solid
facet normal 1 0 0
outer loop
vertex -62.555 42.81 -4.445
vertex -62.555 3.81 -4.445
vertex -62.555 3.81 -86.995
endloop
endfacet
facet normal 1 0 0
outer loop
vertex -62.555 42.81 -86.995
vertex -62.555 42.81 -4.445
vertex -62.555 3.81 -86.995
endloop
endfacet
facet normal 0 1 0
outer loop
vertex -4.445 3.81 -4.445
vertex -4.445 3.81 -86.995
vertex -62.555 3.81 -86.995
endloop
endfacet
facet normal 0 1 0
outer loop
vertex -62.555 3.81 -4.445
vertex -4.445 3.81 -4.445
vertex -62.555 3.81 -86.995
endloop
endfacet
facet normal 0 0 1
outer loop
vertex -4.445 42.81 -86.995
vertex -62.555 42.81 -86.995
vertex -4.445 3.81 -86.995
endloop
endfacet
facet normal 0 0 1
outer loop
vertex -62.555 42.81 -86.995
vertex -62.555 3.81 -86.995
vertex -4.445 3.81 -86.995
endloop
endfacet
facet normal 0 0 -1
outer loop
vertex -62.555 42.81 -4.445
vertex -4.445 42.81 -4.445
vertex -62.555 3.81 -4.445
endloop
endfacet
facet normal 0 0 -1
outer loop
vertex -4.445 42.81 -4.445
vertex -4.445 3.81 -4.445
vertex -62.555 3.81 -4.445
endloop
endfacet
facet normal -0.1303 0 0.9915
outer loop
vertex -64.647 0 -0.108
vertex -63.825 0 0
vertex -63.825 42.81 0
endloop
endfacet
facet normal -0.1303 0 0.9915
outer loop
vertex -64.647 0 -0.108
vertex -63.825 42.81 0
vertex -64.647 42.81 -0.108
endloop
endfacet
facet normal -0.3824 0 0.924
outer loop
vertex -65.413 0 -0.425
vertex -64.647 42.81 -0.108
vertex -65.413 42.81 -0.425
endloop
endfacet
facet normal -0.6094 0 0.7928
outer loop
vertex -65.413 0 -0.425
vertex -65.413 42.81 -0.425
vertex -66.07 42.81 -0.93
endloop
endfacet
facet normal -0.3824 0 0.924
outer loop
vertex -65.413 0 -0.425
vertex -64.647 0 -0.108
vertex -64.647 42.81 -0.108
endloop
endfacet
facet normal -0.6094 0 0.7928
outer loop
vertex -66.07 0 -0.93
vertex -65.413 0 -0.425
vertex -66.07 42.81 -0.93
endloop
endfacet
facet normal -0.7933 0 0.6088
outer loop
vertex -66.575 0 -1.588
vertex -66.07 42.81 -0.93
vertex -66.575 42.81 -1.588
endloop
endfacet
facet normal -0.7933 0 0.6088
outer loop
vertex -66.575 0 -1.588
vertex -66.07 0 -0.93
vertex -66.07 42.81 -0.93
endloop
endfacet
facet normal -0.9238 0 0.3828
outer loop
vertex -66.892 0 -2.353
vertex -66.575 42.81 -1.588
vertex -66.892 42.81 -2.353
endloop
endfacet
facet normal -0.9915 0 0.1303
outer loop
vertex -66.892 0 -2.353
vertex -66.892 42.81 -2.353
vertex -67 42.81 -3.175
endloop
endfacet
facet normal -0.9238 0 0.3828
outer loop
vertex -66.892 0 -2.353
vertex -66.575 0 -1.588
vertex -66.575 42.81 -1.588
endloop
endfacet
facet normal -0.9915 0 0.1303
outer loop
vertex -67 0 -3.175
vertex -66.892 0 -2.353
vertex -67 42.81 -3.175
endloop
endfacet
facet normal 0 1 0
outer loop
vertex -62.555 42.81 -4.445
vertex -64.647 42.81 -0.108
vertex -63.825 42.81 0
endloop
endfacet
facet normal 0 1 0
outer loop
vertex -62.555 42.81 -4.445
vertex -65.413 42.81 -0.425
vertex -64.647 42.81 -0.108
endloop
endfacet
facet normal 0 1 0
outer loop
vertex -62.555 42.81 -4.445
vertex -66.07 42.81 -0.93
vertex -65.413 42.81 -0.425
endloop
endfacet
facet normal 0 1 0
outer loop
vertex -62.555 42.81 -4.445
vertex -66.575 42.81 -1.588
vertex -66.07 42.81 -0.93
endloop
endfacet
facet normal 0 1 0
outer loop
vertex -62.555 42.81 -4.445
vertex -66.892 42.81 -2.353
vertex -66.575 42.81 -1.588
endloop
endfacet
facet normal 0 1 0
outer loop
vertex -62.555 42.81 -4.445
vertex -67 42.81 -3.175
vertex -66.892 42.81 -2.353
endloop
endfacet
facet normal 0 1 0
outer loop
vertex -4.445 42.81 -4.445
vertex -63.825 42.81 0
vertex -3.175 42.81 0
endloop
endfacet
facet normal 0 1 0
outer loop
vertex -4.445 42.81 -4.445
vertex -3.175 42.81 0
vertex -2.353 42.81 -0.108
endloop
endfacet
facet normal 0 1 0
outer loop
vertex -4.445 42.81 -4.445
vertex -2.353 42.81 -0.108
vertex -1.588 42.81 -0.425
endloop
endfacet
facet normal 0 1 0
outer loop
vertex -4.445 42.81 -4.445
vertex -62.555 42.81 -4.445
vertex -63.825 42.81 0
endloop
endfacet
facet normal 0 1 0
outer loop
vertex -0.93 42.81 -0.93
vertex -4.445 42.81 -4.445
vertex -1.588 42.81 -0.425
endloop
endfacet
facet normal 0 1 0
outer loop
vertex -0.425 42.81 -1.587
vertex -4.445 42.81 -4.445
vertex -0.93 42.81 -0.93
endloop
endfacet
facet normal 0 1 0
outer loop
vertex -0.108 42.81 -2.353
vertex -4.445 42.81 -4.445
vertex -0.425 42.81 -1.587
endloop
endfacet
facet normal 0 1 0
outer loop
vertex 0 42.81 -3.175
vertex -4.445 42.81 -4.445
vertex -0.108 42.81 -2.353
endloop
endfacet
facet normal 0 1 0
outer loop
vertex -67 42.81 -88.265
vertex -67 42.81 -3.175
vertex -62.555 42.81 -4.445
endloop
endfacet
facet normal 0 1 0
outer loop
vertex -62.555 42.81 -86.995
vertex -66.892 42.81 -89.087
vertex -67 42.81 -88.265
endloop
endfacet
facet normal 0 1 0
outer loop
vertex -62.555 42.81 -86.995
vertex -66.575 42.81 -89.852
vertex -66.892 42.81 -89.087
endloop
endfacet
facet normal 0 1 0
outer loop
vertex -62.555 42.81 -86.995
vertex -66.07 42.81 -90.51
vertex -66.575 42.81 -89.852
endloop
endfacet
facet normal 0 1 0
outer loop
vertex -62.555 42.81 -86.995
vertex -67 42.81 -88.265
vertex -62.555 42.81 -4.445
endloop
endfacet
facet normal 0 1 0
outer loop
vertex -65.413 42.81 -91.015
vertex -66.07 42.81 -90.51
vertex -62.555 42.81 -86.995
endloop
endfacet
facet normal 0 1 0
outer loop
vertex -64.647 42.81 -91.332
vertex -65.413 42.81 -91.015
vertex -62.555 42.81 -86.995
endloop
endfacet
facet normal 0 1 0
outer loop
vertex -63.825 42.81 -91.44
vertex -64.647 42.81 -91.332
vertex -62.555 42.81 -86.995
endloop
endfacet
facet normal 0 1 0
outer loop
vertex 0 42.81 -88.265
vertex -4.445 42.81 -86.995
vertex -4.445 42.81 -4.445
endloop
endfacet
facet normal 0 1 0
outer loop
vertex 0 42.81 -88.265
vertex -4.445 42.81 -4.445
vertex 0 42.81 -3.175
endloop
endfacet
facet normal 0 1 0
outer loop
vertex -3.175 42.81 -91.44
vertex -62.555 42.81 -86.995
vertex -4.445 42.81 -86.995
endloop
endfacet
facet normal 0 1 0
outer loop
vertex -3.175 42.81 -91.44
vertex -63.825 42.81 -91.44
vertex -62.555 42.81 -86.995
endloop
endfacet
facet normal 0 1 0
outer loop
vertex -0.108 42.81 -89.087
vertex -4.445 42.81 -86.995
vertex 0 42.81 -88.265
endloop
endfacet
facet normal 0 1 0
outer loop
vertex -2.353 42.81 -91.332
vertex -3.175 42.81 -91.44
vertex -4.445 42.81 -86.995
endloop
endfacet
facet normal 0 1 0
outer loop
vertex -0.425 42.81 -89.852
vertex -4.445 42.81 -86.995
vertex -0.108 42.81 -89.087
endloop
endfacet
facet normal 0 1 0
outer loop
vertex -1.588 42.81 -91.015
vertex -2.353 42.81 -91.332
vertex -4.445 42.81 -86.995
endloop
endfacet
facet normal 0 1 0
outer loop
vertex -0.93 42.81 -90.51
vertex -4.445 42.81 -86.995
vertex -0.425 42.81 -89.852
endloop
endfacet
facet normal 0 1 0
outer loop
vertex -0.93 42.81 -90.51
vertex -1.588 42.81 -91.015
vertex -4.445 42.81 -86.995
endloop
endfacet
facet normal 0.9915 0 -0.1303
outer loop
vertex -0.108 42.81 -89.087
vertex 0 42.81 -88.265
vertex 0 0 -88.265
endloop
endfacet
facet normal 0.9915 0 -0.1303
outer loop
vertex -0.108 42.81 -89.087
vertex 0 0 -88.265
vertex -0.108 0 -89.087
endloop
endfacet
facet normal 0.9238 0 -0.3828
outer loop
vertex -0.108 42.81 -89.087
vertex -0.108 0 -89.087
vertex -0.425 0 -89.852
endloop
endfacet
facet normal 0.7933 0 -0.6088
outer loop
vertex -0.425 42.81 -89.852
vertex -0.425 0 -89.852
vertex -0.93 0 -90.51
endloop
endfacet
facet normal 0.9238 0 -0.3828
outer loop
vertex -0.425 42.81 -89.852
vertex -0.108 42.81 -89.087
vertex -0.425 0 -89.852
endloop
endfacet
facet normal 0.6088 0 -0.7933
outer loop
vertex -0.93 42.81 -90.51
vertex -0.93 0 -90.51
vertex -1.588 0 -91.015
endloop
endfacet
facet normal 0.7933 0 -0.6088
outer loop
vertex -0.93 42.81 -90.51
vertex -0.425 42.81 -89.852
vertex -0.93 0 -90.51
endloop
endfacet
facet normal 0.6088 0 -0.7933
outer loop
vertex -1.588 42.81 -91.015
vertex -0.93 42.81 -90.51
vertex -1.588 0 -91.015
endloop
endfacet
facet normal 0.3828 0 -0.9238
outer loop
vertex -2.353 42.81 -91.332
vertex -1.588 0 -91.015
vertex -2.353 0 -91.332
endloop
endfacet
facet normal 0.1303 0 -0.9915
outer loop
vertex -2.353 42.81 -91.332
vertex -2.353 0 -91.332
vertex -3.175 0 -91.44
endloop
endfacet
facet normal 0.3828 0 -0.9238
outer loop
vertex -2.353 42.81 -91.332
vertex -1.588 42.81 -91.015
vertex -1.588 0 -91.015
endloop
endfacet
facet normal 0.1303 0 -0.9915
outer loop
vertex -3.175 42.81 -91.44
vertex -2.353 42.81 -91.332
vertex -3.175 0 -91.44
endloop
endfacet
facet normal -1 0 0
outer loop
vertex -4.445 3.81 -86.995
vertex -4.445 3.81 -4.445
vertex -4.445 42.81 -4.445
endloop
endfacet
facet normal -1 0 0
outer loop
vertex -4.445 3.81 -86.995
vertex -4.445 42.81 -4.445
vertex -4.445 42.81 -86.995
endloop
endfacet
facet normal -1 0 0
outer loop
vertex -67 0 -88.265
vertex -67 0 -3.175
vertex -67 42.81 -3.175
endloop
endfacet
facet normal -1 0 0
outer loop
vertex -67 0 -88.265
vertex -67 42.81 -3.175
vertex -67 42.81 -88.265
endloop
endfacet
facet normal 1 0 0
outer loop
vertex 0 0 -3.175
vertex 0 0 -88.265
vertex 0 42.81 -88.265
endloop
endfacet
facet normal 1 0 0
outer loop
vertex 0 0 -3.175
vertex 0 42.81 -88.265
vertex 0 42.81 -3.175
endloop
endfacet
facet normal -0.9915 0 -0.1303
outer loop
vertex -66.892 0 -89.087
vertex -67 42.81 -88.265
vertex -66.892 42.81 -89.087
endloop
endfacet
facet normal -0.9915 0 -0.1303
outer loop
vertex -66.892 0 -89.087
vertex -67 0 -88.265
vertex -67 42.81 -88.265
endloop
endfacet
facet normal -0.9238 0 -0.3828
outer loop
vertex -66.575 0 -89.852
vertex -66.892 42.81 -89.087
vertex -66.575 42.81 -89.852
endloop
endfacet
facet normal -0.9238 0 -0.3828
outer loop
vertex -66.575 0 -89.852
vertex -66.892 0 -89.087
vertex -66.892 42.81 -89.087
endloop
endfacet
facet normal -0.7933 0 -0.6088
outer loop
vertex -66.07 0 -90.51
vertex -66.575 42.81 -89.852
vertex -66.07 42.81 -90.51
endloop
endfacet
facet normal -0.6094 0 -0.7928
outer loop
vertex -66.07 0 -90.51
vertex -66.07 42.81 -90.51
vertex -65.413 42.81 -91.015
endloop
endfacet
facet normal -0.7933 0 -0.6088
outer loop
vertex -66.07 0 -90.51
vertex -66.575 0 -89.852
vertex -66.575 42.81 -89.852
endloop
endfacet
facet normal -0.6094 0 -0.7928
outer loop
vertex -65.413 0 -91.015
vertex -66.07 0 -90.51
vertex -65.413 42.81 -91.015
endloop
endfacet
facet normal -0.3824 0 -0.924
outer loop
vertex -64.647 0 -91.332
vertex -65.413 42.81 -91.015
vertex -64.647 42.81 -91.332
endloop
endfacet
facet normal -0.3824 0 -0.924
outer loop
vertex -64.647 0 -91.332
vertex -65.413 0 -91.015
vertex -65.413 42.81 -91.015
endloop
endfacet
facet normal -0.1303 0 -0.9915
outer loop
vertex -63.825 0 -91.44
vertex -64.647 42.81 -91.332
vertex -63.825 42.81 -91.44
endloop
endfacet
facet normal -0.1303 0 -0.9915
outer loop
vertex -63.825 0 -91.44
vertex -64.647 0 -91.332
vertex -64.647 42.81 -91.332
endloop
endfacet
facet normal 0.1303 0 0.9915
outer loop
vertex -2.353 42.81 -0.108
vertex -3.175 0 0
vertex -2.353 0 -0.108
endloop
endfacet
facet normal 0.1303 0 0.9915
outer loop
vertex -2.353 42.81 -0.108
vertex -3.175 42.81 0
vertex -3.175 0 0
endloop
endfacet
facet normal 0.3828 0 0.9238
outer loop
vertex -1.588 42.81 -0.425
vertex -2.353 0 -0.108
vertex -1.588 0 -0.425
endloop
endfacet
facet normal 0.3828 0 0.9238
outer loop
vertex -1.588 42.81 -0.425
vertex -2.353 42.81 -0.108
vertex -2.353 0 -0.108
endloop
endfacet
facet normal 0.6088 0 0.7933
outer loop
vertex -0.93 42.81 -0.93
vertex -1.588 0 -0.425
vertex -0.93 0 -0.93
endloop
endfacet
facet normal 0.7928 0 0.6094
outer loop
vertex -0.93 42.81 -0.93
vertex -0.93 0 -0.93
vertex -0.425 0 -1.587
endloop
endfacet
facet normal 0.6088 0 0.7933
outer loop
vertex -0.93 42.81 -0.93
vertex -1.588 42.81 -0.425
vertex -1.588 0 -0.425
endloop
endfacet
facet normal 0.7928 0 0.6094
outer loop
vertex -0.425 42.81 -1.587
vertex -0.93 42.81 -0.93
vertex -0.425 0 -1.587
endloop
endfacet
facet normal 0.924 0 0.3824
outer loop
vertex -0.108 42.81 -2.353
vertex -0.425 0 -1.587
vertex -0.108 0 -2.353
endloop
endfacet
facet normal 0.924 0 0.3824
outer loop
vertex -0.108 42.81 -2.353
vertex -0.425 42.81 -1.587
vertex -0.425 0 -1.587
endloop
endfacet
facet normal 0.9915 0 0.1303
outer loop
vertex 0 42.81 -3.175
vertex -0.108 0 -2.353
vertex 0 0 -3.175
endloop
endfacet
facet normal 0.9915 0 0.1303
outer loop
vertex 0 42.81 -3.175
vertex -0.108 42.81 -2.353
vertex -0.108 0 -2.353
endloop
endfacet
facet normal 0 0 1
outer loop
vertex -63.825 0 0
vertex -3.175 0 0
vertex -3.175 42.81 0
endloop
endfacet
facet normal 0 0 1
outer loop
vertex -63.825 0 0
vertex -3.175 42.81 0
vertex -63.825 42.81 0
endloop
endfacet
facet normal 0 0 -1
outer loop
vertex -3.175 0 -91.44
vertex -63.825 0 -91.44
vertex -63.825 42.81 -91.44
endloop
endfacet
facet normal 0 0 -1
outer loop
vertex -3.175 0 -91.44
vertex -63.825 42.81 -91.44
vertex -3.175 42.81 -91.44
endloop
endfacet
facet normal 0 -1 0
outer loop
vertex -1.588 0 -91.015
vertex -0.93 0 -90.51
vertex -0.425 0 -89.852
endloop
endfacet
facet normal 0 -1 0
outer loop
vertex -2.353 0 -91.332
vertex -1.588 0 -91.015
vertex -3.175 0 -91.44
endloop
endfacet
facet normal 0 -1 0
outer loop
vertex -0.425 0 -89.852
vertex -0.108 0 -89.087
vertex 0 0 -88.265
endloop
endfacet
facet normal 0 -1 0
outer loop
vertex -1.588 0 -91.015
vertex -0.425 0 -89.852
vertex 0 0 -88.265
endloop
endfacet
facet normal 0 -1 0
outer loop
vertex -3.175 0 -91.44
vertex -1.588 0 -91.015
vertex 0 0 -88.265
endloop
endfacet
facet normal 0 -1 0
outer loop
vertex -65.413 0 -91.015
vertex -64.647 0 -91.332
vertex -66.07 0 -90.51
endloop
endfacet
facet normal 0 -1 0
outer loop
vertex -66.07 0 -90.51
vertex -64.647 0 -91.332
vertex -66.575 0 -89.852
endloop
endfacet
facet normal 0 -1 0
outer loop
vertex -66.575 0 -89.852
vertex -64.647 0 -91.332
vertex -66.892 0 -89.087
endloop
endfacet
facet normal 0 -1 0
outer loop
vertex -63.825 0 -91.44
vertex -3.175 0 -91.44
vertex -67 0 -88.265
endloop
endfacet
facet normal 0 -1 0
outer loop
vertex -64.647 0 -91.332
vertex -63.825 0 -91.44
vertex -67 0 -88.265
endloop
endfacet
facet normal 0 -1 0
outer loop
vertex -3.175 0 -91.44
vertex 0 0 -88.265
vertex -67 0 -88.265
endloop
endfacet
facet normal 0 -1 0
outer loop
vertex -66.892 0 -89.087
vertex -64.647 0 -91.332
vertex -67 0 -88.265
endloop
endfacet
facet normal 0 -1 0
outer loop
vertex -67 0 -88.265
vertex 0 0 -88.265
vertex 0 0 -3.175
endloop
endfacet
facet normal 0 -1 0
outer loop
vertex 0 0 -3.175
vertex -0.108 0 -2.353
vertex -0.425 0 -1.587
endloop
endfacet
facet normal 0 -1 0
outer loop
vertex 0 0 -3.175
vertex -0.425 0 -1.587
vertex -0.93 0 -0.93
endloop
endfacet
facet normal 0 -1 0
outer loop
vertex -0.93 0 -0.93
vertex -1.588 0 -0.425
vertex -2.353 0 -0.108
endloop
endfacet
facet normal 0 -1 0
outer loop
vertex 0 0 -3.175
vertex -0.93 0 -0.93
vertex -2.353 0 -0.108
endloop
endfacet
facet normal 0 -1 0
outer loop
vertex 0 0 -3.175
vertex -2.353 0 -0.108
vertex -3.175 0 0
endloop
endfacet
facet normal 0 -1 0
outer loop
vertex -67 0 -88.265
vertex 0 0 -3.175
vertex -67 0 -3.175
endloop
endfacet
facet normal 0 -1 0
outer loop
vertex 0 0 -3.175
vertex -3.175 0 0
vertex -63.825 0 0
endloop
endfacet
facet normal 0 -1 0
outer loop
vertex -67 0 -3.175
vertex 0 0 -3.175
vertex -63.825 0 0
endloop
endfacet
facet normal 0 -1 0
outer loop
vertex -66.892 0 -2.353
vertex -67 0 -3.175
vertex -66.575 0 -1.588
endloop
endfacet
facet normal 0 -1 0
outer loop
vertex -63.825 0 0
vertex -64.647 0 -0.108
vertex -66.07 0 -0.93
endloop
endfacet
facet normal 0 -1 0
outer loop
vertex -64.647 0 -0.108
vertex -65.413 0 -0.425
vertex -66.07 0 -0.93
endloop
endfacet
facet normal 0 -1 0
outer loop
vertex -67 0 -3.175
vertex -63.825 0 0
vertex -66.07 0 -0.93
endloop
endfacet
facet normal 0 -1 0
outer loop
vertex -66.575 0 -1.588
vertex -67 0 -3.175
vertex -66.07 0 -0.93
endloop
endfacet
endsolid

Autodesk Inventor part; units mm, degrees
ref_plane "YZ Plane" through (0, 0, 0) normal (1, 0, 0) x (0, 1, 0)
ref_plane "XZ Plane" through (0, 0, 0) normal (0, 1, 0) x (-1, 0, 0)
ref_plane "XY Plane" through (0, 0, 0) normal (0, 0, 1) x (1, 0, 0)
sketch "Sketch1" plane through (0, 0, 0) normal (0, 1, 0) x (-1, 0, 0)
  line L0 (0, 0) -> (67, 0)
  line L1 (67, 0) -> (67, -91.44)
  line L2 (67, -91.44) -> (0, -91.44)
  line L3 (0, -91.44) -> (0, 0)
  dimension "d0" = 91.44
  dimension "d1" = 67
extrude "Extrusion1" add sketch "Sketch1" along normal blind 3.81
sketch "Sketch3" plane through (0, 3.81, 0) normal (0, 1, 0) x (1, 0, 0)
  line L0 (-67, 0) -> (0, 0) projected
  line L1 (0, 91.44) -> (-67, 91.44) projected
  line L2 (-67, 0) -> (-59.535, 0)
  line L3 (-62.555, 4.445) -> (-62.555, 86.995)
  line L4 (-62.555, 91.44) -> (-67, 91.44)
  line L5 (-67, 91.44) -> (-67, 0)
  line L6 (-33.5, 0) -> (-33.5, 91.44) construction
  line L7 (-59.535, 0) -> (-33.5, 0)
  line L8 (-33.5, 4.445) -> (-62.555, 4.445)
  line L9 (-62.555, 91.44) -> (-33.5, 91.44)
  line L10 (-33.5, 86.995) -> (-62.555, 86.995)
  line L11 (0, 0) -> (-67, 0)
  line L12 (0, 0) -> (-7.465, 0)
  line L13 (-4.445, 4.445) -> (-4.445, 86.995)
  line L14 (-4.445, 91.44) -> (0, 91.44)
  line L15 (0, 91.44) -> (0, 0)
  line L16 (-33.5, 4.445) -> (-4.445, 4.445)
  line L17 (-4.445, 91.44) -> (-33.5, 91.44)
  line L18 (-33.5, 86.995) -> (-4.445, 86.995)
  dimension "d25" = 4.445
  dimension "d27" = 4.445
  dimension "d28" = 4.445
  dimension "d30" = 26.035
  dimension "d31" = 4.445
  dimension "d32" = 86.995
  dimension "d33" = 4.445
extrude "Extrusion2" add sketch "Sketch3" along normal blind 39
fillet "Fillet1" radius 3.175 4 edges at (-67, 21.405, -91.44) (-67, 21.405, 0) (0, 21.405, 0) (0, 21.405, -91.44)
properties part number "Case RevA"
